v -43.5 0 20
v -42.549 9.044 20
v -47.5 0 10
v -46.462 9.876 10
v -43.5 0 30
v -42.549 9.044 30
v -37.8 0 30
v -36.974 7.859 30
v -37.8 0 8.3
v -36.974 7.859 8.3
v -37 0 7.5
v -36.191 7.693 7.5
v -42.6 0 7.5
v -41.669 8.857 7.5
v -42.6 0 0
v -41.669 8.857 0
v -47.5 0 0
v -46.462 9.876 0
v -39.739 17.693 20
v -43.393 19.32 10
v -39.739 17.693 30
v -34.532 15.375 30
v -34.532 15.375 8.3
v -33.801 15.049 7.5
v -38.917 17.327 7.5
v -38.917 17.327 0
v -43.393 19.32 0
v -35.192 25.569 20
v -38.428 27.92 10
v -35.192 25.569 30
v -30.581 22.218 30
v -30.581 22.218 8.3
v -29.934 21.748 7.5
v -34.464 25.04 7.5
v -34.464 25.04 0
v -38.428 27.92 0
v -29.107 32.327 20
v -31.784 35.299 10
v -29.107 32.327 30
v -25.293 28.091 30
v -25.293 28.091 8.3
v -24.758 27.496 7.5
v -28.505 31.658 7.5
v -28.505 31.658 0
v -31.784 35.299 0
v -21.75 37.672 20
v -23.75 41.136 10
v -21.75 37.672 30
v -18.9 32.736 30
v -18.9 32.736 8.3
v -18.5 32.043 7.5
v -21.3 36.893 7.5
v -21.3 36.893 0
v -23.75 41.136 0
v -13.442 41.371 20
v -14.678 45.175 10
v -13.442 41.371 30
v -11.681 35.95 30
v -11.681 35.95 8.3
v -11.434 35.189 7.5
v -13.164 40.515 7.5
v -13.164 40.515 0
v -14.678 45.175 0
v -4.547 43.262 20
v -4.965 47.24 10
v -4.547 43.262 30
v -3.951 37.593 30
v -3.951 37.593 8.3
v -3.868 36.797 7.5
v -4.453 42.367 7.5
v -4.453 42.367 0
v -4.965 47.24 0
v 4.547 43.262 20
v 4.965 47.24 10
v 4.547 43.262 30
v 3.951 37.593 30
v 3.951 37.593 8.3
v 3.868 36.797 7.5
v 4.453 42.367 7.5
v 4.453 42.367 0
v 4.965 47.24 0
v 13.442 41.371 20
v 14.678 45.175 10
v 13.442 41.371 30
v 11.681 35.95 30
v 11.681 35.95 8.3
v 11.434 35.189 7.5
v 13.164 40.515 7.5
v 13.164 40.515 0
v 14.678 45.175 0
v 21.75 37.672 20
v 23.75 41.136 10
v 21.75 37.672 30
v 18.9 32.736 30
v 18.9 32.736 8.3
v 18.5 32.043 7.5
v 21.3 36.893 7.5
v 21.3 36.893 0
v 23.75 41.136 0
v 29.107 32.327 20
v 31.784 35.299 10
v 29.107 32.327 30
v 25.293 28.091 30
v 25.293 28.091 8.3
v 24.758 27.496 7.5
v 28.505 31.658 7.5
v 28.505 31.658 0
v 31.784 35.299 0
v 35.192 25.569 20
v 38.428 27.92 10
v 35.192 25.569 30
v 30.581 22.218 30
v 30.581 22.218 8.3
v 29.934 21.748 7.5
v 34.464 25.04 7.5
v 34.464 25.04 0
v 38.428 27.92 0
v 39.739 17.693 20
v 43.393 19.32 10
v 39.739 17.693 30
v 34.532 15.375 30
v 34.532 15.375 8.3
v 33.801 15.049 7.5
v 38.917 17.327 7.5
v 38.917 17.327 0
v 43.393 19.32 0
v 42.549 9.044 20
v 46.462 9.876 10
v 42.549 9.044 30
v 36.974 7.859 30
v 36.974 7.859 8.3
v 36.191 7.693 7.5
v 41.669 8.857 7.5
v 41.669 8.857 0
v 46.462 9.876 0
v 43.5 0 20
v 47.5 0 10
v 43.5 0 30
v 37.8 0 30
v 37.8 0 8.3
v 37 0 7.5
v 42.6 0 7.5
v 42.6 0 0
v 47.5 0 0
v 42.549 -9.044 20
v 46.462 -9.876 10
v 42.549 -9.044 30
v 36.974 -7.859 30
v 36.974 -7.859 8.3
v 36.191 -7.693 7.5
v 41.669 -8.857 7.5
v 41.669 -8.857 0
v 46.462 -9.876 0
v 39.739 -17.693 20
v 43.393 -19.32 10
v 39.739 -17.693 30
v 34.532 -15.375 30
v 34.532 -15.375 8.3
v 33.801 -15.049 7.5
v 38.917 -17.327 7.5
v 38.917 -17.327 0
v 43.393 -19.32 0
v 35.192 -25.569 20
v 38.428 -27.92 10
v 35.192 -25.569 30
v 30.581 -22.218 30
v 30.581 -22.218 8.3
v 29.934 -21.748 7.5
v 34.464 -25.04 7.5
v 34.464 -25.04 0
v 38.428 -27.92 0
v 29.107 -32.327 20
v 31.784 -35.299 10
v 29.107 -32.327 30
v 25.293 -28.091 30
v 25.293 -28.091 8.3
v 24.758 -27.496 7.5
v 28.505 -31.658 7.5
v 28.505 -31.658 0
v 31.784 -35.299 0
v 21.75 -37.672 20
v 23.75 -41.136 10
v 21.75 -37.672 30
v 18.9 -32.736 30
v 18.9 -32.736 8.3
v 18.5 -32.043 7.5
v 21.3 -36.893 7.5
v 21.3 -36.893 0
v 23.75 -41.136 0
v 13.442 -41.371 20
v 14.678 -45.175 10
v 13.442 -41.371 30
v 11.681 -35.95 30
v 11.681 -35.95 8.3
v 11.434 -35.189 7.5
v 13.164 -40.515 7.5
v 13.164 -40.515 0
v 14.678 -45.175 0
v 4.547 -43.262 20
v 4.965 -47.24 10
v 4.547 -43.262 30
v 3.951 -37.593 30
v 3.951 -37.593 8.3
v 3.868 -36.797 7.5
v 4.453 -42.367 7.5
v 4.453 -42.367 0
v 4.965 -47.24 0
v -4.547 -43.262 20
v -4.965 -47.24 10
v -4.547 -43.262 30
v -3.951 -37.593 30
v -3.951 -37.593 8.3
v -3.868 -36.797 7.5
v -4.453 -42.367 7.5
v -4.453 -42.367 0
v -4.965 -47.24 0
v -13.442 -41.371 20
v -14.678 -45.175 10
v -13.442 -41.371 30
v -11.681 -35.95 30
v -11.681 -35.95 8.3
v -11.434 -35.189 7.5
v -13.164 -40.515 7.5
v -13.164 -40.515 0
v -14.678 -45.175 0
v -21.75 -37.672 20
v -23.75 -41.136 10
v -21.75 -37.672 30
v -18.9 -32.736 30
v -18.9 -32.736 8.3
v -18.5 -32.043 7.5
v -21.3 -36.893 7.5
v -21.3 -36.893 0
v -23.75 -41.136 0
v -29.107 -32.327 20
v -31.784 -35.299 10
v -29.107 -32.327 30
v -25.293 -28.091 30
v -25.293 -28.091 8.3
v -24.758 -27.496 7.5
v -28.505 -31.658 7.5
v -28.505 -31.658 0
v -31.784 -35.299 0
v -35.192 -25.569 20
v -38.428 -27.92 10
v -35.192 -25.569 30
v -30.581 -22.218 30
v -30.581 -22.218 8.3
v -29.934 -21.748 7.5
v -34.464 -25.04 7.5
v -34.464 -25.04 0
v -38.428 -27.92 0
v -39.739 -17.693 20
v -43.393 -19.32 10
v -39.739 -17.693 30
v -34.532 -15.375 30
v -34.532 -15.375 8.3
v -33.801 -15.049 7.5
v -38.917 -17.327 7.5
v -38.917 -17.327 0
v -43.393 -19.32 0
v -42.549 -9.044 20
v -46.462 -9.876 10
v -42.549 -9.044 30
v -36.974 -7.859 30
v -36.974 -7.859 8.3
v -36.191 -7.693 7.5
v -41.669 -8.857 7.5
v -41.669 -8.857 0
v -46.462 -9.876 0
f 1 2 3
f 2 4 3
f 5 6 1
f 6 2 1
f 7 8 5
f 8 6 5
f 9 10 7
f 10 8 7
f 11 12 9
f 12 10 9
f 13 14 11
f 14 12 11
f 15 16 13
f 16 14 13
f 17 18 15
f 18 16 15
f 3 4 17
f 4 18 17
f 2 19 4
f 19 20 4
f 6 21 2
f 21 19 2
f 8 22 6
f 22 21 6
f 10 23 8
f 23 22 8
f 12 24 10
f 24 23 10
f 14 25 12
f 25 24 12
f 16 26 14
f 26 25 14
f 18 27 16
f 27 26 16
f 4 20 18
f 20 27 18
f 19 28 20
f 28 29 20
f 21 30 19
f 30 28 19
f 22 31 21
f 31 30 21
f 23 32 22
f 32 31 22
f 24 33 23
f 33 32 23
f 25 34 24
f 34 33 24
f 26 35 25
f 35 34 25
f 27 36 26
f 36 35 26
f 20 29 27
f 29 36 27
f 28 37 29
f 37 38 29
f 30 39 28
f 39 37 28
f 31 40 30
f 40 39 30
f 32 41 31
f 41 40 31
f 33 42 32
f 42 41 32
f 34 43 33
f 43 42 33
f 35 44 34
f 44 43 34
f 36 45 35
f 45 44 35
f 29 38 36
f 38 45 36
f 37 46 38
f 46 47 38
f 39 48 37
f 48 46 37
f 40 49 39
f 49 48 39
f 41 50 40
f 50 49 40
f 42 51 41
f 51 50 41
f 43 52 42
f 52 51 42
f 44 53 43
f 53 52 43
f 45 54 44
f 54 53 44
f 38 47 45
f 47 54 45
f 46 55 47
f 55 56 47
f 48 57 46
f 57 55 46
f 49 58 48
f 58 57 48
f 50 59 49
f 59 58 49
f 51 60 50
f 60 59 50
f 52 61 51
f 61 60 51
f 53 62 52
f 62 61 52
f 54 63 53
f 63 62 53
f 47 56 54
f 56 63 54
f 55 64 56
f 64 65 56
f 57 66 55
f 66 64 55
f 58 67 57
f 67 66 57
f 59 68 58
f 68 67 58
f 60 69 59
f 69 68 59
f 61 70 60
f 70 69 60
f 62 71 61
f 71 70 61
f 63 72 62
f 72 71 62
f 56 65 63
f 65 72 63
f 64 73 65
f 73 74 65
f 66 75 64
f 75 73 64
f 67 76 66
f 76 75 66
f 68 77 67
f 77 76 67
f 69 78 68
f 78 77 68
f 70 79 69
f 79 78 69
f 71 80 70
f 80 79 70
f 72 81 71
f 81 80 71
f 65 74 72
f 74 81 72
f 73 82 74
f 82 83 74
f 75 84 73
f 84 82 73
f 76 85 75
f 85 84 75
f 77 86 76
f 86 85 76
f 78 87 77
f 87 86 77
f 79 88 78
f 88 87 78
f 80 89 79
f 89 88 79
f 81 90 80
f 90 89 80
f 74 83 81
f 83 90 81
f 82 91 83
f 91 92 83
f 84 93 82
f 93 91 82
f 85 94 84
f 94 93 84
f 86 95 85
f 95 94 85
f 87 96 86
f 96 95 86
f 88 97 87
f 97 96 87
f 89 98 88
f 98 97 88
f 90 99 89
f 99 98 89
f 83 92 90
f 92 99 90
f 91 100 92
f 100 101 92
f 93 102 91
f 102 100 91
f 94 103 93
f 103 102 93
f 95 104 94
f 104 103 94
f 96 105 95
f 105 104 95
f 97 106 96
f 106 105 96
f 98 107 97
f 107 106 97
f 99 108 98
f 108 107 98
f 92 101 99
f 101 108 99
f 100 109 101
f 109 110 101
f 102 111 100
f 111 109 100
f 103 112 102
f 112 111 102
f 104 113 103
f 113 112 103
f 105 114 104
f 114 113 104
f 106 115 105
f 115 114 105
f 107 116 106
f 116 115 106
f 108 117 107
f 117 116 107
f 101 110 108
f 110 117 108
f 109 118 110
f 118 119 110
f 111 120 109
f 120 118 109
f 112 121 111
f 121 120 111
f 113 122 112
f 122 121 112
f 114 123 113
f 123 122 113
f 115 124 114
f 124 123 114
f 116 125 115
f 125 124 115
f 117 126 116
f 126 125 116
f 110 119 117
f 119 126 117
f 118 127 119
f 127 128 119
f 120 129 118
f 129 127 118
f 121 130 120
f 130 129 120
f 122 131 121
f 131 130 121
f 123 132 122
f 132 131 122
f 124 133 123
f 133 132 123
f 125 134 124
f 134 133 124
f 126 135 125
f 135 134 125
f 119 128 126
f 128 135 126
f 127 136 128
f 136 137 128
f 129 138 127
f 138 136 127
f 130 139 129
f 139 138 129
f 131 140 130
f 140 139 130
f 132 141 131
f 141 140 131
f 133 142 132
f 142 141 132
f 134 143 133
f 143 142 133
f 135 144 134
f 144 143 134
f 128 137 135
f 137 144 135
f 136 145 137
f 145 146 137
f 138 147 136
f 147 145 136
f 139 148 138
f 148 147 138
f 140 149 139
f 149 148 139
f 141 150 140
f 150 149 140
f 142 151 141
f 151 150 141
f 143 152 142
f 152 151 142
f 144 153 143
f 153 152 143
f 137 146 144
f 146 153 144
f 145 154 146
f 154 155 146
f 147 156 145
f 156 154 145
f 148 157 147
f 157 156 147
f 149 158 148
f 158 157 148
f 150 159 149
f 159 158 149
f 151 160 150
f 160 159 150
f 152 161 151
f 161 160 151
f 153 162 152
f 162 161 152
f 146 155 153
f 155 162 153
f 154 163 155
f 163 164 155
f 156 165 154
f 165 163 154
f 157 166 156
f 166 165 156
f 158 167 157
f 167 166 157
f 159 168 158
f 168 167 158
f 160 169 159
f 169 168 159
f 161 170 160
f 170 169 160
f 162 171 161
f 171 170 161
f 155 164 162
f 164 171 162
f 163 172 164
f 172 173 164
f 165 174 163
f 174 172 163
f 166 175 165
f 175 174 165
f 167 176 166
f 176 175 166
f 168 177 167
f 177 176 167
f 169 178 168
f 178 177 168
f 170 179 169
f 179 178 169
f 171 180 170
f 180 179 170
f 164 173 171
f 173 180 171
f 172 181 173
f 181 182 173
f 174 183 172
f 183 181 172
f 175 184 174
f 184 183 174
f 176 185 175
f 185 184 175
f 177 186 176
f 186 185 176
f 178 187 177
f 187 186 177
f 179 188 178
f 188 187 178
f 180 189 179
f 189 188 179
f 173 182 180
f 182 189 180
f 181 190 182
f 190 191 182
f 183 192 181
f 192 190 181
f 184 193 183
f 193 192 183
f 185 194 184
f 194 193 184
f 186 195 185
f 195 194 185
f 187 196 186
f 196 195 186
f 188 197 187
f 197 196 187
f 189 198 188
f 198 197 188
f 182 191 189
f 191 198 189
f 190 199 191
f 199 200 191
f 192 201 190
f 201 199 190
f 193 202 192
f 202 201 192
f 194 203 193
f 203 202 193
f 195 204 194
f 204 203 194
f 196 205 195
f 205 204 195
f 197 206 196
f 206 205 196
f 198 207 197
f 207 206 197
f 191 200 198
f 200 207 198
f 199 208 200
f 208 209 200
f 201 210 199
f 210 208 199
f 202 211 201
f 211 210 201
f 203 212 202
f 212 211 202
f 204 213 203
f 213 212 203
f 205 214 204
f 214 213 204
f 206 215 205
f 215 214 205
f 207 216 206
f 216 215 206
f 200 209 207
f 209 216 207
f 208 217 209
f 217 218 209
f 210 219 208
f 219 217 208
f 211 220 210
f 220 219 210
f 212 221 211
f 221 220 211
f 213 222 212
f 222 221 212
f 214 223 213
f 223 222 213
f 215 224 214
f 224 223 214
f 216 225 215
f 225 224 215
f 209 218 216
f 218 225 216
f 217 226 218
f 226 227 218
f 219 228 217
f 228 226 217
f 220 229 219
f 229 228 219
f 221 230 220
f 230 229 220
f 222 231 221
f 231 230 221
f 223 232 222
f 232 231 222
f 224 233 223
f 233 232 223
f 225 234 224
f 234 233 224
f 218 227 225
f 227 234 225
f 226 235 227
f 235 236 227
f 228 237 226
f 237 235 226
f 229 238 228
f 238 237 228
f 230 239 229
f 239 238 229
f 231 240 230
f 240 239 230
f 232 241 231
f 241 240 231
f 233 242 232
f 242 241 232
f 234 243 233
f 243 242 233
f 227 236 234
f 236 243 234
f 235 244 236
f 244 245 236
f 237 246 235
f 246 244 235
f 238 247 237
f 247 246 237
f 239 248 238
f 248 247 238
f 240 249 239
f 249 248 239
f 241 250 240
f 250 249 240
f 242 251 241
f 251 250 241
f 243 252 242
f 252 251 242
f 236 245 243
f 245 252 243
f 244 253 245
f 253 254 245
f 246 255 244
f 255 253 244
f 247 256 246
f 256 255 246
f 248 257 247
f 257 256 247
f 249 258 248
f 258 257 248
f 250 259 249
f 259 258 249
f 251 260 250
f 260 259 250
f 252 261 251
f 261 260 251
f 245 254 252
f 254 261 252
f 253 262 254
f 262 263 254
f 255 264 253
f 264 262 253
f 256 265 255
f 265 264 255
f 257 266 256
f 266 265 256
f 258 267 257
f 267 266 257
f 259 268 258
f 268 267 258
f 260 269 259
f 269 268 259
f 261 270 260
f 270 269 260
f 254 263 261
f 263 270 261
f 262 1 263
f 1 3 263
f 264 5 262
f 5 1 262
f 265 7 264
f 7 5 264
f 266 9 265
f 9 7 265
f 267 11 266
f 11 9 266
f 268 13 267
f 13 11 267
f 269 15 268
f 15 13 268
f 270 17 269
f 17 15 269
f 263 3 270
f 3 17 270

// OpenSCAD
height_bottom = 7.5;
height = 30;

bottom = 82/2 + 1.6;
top = 74/2 + 0.8;
outer = 95/2;
outer_top = 87/2;
ring = 74/2;

rotate_extrude()
polygon(points=[
    [bottom, 0],
    [bottom, height_bottom],
    [ring, height_bottom],
    [top, height_bottom + top - ring],
    [top, height],
    [outer_top, height],
    [outer_top, height * 2/3],
    [outer, height * 1/3],
    [outer, 0],
]);
